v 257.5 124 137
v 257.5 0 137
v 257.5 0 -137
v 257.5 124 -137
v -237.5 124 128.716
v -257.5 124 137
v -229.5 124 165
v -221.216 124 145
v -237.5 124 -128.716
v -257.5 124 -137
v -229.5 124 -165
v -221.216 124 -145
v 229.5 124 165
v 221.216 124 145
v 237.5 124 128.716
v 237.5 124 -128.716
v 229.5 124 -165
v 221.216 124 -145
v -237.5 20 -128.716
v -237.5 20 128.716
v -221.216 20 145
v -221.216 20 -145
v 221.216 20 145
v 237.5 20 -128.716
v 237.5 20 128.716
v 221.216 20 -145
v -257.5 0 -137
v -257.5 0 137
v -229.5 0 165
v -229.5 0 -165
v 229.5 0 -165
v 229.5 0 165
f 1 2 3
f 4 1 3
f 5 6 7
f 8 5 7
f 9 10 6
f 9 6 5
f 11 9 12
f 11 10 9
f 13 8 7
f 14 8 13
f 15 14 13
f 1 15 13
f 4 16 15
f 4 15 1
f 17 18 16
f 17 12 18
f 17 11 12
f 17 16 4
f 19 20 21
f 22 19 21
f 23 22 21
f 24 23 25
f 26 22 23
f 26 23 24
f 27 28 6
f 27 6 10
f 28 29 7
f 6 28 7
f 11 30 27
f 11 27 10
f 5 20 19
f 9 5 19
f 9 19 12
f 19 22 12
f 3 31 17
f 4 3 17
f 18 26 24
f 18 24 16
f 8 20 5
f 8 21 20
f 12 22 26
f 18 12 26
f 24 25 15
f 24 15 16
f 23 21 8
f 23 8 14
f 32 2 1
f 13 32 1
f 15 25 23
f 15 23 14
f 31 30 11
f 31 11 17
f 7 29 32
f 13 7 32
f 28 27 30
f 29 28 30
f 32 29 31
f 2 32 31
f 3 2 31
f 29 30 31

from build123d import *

# Parameters (mm, degrees)
SKETCH1_W           = 515
SKETCH1_H           = 330
BOSS_EXTRUDE1_DEPTH = 124
CHAMFER1_SIZE       = 28
SHELL1_T            = -20


with BuildPart() as part:
    # Sketch1 → Boss-Extrude1 (new body)
    with BuildSketch(Plane(origin=(0, 0, 0), x_dir=(1, 0, 0), z_dir=(0, 1, 0))):
        Rectangle(SKETCH1_W, SKETCH1_H)
    extrude(amount=BOSS_EXTRUDE1_DEPTH)

    # Chamfer1
    chamfer1_edges = [part.edges().sort_by_distance(p)[0] for p in [
        (257.5, 62, 165),
        (-257.5, 62, 165),
        (-257.5, 62, -165),
        (257.5, 62, -165),
    ]]
    chamfer(chamfer1_edges, length=CHAMFER1_SIZE)

    # Shell1
    shell1_openings = [part.faces().sort_by_distance(p)[0] for p in [
        (0, 124, 0),
    ]]
    offset(amount=SHELL1_T, openings=shell1_openings, kind=Kind.INTERSECTION)


solid = part.part
